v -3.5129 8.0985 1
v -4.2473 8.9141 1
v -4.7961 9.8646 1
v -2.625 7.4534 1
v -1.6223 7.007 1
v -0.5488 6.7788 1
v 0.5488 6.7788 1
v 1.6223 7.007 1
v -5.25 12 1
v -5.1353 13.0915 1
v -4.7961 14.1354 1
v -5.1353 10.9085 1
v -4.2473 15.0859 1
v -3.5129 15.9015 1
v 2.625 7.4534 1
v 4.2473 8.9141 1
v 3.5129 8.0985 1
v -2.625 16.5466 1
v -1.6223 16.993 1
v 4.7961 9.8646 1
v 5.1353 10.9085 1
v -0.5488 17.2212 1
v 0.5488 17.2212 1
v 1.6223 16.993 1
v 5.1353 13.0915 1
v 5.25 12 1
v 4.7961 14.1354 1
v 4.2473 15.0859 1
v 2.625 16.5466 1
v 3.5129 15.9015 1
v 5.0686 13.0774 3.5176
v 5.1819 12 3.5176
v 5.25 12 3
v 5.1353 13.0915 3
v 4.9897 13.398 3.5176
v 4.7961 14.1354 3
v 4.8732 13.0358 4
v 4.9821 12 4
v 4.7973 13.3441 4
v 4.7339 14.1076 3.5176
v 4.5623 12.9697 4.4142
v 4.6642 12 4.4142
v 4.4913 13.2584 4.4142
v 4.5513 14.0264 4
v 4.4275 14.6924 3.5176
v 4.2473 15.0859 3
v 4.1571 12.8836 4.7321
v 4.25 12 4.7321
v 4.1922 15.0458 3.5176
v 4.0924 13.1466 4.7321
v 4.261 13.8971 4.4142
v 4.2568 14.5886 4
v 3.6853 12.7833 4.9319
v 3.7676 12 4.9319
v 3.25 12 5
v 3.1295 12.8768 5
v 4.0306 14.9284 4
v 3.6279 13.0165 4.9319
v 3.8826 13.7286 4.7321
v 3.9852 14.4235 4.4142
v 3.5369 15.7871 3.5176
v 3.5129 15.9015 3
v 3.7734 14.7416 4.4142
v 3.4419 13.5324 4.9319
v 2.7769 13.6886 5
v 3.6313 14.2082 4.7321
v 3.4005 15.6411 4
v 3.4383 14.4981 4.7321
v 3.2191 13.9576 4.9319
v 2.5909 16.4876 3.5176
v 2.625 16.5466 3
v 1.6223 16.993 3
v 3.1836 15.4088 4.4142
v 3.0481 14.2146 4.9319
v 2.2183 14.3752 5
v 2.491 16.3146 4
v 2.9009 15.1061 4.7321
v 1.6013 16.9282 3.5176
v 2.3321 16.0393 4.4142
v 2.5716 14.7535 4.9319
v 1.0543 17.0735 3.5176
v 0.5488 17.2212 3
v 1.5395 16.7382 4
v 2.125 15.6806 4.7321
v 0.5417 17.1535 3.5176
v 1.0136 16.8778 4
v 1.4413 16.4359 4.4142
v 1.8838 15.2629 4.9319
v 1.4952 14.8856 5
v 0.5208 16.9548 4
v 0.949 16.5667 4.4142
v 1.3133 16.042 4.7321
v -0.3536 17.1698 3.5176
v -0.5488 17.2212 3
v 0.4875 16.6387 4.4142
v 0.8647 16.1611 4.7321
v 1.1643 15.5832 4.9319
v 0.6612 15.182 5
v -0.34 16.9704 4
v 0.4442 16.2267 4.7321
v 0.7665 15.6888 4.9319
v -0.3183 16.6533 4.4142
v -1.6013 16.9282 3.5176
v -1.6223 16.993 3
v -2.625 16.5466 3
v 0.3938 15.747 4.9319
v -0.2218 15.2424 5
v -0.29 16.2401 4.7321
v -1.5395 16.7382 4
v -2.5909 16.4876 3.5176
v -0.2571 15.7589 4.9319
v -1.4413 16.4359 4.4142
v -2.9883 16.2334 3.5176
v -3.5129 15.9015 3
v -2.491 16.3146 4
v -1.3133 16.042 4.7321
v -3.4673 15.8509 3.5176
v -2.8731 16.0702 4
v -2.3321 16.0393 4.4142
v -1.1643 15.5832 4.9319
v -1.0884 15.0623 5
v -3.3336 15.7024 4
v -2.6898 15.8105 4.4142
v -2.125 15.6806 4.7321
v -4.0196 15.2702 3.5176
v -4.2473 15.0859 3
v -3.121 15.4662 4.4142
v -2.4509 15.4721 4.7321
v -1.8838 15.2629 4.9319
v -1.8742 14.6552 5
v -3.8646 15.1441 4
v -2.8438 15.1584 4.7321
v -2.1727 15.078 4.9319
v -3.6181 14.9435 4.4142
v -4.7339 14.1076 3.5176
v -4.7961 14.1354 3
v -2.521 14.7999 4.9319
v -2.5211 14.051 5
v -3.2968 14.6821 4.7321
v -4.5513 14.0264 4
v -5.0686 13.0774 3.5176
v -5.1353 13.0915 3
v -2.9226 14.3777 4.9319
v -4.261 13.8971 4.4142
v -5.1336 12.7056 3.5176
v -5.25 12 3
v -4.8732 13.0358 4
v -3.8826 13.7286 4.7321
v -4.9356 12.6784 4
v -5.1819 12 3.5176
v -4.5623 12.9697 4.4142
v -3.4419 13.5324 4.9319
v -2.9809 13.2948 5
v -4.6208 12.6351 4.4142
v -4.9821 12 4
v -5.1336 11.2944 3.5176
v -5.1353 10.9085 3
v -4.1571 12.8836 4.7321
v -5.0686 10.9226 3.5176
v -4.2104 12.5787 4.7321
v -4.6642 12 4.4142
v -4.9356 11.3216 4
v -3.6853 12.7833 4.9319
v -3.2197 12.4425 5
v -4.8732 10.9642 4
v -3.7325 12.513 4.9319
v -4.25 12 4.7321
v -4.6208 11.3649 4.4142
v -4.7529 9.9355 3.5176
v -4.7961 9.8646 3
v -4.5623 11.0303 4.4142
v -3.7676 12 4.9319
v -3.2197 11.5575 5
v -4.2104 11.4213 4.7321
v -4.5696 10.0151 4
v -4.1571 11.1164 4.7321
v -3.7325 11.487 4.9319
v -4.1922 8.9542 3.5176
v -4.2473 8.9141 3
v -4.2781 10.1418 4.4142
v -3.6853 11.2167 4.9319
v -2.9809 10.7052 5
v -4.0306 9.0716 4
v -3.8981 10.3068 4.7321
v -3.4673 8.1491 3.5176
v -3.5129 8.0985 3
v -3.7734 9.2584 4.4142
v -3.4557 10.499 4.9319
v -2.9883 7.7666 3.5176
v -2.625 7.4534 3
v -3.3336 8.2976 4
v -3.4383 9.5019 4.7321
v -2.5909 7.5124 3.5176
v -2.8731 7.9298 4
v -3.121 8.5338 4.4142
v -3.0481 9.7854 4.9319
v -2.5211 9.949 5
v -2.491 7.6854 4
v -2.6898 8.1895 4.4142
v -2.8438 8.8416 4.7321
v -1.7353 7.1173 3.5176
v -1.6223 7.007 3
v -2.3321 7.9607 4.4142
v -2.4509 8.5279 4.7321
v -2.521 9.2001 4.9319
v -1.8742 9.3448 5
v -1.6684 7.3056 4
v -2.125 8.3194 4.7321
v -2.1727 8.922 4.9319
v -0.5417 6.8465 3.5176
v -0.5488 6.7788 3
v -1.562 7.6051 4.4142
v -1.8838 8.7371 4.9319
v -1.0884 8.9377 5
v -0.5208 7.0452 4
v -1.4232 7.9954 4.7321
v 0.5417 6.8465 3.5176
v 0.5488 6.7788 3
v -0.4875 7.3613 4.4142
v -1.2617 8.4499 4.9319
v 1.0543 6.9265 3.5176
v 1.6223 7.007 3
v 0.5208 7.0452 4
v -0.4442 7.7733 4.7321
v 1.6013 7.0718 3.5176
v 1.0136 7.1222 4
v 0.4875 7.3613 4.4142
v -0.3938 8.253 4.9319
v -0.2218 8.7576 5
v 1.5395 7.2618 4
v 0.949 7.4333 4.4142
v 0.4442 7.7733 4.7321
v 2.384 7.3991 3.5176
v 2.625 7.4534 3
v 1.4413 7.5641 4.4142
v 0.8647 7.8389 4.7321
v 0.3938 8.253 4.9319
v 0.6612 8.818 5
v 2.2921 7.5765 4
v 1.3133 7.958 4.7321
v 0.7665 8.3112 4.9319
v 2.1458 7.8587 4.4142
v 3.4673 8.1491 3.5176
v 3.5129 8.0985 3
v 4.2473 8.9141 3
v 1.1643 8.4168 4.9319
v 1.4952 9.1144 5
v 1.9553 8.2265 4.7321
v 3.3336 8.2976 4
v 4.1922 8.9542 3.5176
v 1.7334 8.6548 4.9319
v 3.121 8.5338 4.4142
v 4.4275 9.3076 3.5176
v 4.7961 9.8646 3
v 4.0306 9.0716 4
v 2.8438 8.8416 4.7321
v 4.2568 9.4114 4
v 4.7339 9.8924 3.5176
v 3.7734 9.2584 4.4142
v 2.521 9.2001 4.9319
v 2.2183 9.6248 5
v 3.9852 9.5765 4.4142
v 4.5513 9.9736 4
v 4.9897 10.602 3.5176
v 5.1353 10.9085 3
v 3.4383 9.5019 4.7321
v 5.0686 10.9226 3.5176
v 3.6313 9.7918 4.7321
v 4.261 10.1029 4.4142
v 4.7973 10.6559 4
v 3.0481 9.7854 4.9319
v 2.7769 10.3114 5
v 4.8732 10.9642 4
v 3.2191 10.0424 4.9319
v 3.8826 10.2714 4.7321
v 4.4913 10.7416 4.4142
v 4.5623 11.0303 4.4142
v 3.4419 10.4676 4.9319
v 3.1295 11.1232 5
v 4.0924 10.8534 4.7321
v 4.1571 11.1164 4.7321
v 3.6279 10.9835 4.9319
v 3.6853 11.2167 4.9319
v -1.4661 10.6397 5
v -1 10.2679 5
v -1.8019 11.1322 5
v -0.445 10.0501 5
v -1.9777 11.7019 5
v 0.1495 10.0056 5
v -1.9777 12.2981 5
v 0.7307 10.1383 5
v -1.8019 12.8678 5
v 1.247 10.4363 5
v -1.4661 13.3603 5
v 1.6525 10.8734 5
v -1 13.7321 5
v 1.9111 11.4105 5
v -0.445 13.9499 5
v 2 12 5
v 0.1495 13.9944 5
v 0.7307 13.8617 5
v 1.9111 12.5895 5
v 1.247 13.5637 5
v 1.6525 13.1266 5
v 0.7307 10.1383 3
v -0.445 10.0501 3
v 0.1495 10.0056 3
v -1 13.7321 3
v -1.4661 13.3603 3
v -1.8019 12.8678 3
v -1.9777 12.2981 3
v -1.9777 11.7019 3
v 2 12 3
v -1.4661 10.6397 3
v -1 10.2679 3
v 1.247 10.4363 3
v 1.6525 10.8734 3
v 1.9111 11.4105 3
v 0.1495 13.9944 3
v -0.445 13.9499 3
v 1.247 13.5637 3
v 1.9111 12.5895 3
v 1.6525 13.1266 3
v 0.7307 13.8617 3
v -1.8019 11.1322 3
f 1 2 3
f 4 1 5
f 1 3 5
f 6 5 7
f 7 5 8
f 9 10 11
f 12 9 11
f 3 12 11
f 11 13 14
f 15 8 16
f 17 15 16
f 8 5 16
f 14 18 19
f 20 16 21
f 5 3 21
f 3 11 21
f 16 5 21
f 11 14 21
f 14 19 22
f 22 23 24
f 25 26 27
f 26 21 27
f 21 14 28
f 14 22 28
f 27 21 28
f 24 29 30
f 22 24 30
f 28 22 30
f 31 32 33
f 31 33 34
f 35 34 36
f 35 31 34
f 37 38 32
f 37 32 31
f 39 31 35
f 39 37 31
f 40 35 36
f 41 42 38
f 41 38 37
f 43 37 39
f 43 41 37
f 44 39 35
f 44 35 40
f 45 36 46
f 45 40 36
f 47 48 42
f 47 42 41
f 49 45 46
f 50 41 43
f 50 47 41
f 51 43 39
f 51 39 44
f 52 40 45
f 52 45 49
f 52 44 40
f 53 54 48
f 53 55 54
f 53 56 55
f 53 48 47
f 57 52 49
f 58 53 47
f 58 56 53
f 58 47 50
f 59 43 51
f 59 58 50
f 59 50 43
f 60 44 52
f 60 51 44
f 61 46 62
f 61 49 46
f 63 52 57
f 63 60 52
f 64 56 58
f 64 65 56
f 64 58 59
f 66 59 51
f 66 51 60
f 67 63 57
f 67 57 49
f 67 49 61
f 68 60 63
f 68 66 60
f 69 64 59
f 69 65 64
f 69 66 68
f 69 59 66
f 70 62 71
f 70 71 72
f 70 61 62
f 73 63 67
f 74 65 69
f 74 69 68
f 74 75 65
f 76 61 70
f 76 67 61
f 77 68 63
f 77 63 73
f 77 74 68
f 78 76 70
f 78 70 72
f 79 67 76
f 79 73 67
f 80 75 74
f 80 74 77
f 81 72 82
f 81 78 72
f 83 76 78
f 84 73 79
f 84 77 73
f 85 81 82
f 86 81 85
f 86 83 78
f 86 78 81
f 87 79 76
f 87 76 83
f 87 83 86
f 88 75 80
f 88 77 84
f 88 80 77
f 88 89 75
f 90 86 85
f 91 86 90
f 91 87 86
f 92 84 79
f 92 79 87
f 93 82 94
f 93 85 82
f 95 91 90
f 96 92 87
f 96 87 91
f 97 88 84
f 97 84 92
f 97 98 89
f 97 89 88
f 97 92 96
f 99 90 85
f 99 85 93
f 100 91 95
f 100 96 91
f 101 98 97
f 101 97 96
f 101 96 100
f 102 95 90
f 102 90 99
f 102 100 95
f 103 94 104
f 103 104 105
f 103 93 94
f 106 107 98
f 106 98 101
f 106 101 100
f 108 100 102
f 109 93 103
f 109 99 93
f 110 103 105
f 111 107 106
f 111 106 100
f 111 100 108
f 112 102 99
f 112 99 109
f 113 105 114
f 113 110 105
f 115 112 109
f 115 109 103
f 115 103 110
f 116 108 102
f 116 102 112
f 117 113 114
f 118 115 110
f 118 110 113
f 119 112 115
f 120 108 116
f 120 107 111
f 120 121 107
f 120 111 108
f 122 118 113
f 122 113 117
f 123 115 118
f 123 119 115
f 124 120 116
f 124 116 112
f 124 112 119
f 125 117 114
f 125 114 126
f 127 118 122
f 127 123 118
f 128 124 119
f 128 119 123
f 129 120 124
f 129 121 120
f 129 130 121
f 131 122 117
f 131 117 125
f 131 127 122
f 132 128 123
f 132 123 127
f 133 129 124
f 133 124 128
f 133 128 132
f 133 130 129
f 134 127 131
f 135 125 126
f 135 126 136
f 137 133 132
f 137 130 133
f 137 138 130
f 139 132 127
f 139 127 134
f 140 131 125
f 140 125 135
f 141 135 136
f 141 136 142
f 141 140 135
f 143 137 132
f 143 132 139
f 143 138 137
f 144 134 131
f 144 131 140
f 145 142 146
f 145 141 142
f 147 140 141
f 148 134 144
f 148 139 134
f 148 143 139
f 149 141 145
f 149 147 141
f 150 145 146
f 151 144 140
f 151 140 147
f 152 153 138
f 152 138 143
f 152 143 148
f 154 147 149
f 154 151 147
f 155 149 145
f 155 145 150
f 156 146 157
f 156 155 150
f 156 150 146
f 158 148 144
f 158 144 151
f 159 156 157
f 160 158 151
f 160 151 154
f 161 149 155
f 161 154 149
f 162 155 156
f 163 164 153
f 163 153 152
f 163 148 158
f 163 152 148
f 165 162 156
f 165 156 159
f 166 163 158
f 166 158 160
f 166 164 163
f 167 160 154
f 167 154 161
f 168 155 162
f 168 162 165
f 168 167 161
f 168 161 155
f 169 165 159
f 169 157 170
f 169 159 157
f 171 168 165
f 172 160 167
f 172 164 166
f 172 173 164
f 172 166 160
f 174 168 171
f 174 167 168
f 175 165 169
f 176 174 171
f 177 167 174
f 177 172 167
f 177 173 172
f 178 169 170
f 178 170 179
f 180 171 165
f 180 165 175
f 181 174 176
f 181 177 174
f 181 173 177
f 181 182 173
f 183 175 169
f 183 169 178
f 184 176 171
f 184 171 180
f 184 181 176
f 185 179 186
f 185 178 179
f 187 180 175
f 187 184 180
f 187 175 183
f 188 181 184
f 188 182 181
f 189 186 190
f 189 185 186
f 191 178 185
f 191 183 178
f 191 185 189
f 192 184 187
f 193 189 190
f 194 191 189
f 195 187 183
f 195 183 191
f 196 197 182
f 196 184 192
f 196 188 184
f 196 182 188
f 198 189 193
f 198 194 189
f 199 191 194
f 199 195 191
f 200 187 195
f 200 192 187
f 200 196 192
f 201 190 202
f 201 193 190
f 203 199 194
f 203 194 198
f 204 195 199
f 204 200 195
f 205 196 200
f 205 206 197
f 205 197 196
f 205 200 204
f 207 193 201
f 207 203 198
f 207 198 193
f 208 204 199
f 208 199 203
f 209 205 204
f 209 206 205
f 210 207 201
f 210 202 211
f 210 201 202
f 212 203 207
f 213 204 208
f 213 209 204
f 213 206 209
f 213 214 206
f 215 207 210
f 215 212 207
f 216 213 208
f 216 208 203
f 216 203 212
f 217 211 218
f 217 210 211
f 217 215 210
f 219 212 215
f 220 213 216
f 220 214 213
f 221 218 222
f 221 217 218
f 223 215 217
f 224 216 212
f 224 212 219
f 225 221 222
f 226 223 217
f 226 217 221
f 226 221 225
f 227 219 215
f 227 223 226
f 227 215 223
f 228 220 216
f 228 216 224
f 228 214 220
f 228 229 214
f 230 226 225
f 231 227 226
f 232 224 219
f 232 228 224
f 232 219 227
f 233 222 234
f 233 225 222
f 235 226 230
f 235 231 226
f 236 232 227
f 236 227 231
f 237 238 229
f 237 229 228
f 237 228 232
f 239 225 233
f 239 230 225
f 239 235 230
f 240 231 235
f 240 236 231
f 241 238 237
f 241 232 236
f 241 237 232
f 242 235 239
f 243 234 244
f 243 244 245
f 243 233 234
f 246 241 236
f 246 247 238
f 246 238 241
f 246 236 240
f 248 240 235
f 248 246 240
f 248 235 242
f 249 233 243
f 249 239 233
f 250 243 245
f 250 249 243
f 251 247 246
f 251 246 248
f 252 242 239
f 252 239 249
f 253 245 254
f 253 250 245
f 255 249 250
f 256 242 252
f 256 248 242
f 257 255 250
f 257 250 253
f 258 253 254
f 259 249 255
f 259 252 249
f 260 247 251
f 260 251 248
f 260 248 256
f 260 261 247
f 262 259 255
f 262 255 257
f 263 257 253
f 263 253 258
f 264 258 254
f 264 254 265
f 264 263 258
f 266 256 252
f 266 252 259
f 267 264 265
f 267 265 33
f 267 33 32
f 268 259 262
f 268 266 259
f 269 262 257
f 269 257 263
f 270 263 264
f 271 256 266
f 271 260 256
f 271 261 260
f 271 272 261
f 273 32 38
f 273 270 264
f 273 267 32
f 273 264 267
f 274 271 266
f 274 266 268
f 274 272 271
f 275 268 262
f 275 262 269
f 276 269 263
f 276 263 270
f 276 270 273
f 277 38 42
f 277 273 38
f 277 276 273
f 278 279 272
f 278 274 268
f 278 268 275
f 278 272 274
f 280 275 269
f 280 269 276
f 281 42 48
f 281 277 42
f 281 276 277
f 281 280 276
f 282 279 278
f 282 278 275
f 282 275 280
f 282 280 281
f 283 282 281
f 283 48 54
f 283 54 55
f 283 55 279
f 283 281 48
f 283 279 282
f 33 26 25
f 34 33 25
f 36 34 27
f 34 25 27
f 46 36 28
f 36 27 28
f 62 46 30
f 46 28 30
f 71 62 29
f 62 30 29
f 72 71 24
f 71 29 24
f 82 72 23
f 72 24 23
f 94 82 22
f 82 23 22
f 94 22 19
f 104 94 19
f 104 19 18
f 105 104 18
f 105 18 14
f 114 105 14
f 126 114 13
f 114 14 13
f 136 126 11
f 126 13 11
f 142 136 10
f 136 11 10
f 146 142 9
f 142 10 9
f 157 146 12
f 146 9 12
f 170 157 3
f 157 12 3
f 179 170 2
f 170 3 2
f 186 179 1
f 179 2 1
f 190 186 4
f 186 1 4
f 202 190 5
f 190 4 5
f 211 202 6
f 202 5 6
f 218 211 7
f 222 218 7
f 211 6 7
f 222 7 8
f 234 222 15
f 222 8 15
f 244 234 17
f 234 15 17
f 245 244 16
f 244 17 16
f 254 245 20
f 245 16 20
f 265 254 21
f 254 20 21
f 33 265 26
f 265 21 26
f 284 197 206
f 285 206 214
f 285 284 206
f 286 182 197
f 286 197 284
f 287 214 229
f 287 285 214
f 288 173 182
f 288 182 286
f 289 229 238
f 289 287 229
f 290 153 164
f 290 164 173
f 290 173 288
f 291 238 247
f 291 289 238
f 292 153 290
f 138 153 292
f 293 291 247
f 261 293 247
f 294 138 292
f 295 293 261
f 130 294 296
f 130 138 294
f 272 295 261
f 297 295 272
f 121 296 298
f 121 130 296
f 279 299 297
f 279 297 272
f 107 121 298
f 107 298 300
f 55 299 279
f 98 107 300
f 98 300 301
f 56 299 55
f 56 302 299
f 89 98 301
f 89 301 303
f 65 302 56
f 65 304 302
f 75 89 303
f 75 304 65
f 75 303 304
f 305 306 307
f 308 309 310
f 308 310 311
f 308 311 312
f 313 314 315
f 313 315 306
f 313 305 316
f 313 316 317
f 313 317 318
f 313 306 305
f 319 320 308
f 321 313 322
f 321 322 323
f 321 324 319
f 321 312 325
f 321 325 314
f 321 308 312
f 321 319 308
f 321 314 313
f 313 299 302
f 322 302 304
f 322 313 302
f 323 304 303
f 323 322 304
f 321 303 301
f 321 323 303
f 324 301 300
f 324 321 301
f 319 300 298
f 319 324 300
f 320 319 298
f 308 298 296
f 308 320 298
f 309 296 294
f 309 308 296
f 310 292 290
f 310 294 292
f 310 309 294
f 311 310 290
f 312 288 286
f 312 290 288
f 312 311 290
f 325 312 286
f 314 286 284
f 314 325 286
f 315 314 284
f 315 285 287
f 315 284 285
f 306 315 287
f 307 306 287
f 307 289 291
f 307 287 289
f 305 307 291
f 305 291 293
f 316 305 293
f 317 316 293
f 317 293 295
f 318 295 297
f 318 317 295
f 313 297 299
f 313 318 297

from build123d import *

# Parameters (mm, degrees)
CYLINDER001_R     = 2
CYLINDER001_DEPTH = 4
CYLINDER002_R     = 5.25
CYLINDER002_DEPTH = 4
FILLET_R          = 2


with BuildPart() as cylinder001:
    # Cylinder001 → Cylinder001 (new body)
    with BuildSketch(Plane(origin=(0, 12, 3), x_dir=(1, 0, 0), z_dir=(0, 0, 1))):
        Circle(CYLINDER001_R)
    extrude(amount=CYLINDER001_DEPTH)


with BuildPart() as cut:
    # Cylinder002 → Cylinder002 (new body)
    with BuildSketch(Plane(origin=(0, 12, 1), x_dir=(1, 0, 0), z_dir=(0, 0, 1))):
        Circle(CYLINDER002_R)
    extrude(amount=CYLINDER002_DEPTH)

    # Fillet
    fillet_edges = [cut.edges().sort_by_distance(p)[0] for p in [
        (-5.25, 12, 5),
    ]]
    fillet(fillet_edges, radius=FILLET_R)

    # Cut: cut Cylinder001
    add(cylinder001.part, mode=Mode.SUBTRACT)


solid = cut.part
